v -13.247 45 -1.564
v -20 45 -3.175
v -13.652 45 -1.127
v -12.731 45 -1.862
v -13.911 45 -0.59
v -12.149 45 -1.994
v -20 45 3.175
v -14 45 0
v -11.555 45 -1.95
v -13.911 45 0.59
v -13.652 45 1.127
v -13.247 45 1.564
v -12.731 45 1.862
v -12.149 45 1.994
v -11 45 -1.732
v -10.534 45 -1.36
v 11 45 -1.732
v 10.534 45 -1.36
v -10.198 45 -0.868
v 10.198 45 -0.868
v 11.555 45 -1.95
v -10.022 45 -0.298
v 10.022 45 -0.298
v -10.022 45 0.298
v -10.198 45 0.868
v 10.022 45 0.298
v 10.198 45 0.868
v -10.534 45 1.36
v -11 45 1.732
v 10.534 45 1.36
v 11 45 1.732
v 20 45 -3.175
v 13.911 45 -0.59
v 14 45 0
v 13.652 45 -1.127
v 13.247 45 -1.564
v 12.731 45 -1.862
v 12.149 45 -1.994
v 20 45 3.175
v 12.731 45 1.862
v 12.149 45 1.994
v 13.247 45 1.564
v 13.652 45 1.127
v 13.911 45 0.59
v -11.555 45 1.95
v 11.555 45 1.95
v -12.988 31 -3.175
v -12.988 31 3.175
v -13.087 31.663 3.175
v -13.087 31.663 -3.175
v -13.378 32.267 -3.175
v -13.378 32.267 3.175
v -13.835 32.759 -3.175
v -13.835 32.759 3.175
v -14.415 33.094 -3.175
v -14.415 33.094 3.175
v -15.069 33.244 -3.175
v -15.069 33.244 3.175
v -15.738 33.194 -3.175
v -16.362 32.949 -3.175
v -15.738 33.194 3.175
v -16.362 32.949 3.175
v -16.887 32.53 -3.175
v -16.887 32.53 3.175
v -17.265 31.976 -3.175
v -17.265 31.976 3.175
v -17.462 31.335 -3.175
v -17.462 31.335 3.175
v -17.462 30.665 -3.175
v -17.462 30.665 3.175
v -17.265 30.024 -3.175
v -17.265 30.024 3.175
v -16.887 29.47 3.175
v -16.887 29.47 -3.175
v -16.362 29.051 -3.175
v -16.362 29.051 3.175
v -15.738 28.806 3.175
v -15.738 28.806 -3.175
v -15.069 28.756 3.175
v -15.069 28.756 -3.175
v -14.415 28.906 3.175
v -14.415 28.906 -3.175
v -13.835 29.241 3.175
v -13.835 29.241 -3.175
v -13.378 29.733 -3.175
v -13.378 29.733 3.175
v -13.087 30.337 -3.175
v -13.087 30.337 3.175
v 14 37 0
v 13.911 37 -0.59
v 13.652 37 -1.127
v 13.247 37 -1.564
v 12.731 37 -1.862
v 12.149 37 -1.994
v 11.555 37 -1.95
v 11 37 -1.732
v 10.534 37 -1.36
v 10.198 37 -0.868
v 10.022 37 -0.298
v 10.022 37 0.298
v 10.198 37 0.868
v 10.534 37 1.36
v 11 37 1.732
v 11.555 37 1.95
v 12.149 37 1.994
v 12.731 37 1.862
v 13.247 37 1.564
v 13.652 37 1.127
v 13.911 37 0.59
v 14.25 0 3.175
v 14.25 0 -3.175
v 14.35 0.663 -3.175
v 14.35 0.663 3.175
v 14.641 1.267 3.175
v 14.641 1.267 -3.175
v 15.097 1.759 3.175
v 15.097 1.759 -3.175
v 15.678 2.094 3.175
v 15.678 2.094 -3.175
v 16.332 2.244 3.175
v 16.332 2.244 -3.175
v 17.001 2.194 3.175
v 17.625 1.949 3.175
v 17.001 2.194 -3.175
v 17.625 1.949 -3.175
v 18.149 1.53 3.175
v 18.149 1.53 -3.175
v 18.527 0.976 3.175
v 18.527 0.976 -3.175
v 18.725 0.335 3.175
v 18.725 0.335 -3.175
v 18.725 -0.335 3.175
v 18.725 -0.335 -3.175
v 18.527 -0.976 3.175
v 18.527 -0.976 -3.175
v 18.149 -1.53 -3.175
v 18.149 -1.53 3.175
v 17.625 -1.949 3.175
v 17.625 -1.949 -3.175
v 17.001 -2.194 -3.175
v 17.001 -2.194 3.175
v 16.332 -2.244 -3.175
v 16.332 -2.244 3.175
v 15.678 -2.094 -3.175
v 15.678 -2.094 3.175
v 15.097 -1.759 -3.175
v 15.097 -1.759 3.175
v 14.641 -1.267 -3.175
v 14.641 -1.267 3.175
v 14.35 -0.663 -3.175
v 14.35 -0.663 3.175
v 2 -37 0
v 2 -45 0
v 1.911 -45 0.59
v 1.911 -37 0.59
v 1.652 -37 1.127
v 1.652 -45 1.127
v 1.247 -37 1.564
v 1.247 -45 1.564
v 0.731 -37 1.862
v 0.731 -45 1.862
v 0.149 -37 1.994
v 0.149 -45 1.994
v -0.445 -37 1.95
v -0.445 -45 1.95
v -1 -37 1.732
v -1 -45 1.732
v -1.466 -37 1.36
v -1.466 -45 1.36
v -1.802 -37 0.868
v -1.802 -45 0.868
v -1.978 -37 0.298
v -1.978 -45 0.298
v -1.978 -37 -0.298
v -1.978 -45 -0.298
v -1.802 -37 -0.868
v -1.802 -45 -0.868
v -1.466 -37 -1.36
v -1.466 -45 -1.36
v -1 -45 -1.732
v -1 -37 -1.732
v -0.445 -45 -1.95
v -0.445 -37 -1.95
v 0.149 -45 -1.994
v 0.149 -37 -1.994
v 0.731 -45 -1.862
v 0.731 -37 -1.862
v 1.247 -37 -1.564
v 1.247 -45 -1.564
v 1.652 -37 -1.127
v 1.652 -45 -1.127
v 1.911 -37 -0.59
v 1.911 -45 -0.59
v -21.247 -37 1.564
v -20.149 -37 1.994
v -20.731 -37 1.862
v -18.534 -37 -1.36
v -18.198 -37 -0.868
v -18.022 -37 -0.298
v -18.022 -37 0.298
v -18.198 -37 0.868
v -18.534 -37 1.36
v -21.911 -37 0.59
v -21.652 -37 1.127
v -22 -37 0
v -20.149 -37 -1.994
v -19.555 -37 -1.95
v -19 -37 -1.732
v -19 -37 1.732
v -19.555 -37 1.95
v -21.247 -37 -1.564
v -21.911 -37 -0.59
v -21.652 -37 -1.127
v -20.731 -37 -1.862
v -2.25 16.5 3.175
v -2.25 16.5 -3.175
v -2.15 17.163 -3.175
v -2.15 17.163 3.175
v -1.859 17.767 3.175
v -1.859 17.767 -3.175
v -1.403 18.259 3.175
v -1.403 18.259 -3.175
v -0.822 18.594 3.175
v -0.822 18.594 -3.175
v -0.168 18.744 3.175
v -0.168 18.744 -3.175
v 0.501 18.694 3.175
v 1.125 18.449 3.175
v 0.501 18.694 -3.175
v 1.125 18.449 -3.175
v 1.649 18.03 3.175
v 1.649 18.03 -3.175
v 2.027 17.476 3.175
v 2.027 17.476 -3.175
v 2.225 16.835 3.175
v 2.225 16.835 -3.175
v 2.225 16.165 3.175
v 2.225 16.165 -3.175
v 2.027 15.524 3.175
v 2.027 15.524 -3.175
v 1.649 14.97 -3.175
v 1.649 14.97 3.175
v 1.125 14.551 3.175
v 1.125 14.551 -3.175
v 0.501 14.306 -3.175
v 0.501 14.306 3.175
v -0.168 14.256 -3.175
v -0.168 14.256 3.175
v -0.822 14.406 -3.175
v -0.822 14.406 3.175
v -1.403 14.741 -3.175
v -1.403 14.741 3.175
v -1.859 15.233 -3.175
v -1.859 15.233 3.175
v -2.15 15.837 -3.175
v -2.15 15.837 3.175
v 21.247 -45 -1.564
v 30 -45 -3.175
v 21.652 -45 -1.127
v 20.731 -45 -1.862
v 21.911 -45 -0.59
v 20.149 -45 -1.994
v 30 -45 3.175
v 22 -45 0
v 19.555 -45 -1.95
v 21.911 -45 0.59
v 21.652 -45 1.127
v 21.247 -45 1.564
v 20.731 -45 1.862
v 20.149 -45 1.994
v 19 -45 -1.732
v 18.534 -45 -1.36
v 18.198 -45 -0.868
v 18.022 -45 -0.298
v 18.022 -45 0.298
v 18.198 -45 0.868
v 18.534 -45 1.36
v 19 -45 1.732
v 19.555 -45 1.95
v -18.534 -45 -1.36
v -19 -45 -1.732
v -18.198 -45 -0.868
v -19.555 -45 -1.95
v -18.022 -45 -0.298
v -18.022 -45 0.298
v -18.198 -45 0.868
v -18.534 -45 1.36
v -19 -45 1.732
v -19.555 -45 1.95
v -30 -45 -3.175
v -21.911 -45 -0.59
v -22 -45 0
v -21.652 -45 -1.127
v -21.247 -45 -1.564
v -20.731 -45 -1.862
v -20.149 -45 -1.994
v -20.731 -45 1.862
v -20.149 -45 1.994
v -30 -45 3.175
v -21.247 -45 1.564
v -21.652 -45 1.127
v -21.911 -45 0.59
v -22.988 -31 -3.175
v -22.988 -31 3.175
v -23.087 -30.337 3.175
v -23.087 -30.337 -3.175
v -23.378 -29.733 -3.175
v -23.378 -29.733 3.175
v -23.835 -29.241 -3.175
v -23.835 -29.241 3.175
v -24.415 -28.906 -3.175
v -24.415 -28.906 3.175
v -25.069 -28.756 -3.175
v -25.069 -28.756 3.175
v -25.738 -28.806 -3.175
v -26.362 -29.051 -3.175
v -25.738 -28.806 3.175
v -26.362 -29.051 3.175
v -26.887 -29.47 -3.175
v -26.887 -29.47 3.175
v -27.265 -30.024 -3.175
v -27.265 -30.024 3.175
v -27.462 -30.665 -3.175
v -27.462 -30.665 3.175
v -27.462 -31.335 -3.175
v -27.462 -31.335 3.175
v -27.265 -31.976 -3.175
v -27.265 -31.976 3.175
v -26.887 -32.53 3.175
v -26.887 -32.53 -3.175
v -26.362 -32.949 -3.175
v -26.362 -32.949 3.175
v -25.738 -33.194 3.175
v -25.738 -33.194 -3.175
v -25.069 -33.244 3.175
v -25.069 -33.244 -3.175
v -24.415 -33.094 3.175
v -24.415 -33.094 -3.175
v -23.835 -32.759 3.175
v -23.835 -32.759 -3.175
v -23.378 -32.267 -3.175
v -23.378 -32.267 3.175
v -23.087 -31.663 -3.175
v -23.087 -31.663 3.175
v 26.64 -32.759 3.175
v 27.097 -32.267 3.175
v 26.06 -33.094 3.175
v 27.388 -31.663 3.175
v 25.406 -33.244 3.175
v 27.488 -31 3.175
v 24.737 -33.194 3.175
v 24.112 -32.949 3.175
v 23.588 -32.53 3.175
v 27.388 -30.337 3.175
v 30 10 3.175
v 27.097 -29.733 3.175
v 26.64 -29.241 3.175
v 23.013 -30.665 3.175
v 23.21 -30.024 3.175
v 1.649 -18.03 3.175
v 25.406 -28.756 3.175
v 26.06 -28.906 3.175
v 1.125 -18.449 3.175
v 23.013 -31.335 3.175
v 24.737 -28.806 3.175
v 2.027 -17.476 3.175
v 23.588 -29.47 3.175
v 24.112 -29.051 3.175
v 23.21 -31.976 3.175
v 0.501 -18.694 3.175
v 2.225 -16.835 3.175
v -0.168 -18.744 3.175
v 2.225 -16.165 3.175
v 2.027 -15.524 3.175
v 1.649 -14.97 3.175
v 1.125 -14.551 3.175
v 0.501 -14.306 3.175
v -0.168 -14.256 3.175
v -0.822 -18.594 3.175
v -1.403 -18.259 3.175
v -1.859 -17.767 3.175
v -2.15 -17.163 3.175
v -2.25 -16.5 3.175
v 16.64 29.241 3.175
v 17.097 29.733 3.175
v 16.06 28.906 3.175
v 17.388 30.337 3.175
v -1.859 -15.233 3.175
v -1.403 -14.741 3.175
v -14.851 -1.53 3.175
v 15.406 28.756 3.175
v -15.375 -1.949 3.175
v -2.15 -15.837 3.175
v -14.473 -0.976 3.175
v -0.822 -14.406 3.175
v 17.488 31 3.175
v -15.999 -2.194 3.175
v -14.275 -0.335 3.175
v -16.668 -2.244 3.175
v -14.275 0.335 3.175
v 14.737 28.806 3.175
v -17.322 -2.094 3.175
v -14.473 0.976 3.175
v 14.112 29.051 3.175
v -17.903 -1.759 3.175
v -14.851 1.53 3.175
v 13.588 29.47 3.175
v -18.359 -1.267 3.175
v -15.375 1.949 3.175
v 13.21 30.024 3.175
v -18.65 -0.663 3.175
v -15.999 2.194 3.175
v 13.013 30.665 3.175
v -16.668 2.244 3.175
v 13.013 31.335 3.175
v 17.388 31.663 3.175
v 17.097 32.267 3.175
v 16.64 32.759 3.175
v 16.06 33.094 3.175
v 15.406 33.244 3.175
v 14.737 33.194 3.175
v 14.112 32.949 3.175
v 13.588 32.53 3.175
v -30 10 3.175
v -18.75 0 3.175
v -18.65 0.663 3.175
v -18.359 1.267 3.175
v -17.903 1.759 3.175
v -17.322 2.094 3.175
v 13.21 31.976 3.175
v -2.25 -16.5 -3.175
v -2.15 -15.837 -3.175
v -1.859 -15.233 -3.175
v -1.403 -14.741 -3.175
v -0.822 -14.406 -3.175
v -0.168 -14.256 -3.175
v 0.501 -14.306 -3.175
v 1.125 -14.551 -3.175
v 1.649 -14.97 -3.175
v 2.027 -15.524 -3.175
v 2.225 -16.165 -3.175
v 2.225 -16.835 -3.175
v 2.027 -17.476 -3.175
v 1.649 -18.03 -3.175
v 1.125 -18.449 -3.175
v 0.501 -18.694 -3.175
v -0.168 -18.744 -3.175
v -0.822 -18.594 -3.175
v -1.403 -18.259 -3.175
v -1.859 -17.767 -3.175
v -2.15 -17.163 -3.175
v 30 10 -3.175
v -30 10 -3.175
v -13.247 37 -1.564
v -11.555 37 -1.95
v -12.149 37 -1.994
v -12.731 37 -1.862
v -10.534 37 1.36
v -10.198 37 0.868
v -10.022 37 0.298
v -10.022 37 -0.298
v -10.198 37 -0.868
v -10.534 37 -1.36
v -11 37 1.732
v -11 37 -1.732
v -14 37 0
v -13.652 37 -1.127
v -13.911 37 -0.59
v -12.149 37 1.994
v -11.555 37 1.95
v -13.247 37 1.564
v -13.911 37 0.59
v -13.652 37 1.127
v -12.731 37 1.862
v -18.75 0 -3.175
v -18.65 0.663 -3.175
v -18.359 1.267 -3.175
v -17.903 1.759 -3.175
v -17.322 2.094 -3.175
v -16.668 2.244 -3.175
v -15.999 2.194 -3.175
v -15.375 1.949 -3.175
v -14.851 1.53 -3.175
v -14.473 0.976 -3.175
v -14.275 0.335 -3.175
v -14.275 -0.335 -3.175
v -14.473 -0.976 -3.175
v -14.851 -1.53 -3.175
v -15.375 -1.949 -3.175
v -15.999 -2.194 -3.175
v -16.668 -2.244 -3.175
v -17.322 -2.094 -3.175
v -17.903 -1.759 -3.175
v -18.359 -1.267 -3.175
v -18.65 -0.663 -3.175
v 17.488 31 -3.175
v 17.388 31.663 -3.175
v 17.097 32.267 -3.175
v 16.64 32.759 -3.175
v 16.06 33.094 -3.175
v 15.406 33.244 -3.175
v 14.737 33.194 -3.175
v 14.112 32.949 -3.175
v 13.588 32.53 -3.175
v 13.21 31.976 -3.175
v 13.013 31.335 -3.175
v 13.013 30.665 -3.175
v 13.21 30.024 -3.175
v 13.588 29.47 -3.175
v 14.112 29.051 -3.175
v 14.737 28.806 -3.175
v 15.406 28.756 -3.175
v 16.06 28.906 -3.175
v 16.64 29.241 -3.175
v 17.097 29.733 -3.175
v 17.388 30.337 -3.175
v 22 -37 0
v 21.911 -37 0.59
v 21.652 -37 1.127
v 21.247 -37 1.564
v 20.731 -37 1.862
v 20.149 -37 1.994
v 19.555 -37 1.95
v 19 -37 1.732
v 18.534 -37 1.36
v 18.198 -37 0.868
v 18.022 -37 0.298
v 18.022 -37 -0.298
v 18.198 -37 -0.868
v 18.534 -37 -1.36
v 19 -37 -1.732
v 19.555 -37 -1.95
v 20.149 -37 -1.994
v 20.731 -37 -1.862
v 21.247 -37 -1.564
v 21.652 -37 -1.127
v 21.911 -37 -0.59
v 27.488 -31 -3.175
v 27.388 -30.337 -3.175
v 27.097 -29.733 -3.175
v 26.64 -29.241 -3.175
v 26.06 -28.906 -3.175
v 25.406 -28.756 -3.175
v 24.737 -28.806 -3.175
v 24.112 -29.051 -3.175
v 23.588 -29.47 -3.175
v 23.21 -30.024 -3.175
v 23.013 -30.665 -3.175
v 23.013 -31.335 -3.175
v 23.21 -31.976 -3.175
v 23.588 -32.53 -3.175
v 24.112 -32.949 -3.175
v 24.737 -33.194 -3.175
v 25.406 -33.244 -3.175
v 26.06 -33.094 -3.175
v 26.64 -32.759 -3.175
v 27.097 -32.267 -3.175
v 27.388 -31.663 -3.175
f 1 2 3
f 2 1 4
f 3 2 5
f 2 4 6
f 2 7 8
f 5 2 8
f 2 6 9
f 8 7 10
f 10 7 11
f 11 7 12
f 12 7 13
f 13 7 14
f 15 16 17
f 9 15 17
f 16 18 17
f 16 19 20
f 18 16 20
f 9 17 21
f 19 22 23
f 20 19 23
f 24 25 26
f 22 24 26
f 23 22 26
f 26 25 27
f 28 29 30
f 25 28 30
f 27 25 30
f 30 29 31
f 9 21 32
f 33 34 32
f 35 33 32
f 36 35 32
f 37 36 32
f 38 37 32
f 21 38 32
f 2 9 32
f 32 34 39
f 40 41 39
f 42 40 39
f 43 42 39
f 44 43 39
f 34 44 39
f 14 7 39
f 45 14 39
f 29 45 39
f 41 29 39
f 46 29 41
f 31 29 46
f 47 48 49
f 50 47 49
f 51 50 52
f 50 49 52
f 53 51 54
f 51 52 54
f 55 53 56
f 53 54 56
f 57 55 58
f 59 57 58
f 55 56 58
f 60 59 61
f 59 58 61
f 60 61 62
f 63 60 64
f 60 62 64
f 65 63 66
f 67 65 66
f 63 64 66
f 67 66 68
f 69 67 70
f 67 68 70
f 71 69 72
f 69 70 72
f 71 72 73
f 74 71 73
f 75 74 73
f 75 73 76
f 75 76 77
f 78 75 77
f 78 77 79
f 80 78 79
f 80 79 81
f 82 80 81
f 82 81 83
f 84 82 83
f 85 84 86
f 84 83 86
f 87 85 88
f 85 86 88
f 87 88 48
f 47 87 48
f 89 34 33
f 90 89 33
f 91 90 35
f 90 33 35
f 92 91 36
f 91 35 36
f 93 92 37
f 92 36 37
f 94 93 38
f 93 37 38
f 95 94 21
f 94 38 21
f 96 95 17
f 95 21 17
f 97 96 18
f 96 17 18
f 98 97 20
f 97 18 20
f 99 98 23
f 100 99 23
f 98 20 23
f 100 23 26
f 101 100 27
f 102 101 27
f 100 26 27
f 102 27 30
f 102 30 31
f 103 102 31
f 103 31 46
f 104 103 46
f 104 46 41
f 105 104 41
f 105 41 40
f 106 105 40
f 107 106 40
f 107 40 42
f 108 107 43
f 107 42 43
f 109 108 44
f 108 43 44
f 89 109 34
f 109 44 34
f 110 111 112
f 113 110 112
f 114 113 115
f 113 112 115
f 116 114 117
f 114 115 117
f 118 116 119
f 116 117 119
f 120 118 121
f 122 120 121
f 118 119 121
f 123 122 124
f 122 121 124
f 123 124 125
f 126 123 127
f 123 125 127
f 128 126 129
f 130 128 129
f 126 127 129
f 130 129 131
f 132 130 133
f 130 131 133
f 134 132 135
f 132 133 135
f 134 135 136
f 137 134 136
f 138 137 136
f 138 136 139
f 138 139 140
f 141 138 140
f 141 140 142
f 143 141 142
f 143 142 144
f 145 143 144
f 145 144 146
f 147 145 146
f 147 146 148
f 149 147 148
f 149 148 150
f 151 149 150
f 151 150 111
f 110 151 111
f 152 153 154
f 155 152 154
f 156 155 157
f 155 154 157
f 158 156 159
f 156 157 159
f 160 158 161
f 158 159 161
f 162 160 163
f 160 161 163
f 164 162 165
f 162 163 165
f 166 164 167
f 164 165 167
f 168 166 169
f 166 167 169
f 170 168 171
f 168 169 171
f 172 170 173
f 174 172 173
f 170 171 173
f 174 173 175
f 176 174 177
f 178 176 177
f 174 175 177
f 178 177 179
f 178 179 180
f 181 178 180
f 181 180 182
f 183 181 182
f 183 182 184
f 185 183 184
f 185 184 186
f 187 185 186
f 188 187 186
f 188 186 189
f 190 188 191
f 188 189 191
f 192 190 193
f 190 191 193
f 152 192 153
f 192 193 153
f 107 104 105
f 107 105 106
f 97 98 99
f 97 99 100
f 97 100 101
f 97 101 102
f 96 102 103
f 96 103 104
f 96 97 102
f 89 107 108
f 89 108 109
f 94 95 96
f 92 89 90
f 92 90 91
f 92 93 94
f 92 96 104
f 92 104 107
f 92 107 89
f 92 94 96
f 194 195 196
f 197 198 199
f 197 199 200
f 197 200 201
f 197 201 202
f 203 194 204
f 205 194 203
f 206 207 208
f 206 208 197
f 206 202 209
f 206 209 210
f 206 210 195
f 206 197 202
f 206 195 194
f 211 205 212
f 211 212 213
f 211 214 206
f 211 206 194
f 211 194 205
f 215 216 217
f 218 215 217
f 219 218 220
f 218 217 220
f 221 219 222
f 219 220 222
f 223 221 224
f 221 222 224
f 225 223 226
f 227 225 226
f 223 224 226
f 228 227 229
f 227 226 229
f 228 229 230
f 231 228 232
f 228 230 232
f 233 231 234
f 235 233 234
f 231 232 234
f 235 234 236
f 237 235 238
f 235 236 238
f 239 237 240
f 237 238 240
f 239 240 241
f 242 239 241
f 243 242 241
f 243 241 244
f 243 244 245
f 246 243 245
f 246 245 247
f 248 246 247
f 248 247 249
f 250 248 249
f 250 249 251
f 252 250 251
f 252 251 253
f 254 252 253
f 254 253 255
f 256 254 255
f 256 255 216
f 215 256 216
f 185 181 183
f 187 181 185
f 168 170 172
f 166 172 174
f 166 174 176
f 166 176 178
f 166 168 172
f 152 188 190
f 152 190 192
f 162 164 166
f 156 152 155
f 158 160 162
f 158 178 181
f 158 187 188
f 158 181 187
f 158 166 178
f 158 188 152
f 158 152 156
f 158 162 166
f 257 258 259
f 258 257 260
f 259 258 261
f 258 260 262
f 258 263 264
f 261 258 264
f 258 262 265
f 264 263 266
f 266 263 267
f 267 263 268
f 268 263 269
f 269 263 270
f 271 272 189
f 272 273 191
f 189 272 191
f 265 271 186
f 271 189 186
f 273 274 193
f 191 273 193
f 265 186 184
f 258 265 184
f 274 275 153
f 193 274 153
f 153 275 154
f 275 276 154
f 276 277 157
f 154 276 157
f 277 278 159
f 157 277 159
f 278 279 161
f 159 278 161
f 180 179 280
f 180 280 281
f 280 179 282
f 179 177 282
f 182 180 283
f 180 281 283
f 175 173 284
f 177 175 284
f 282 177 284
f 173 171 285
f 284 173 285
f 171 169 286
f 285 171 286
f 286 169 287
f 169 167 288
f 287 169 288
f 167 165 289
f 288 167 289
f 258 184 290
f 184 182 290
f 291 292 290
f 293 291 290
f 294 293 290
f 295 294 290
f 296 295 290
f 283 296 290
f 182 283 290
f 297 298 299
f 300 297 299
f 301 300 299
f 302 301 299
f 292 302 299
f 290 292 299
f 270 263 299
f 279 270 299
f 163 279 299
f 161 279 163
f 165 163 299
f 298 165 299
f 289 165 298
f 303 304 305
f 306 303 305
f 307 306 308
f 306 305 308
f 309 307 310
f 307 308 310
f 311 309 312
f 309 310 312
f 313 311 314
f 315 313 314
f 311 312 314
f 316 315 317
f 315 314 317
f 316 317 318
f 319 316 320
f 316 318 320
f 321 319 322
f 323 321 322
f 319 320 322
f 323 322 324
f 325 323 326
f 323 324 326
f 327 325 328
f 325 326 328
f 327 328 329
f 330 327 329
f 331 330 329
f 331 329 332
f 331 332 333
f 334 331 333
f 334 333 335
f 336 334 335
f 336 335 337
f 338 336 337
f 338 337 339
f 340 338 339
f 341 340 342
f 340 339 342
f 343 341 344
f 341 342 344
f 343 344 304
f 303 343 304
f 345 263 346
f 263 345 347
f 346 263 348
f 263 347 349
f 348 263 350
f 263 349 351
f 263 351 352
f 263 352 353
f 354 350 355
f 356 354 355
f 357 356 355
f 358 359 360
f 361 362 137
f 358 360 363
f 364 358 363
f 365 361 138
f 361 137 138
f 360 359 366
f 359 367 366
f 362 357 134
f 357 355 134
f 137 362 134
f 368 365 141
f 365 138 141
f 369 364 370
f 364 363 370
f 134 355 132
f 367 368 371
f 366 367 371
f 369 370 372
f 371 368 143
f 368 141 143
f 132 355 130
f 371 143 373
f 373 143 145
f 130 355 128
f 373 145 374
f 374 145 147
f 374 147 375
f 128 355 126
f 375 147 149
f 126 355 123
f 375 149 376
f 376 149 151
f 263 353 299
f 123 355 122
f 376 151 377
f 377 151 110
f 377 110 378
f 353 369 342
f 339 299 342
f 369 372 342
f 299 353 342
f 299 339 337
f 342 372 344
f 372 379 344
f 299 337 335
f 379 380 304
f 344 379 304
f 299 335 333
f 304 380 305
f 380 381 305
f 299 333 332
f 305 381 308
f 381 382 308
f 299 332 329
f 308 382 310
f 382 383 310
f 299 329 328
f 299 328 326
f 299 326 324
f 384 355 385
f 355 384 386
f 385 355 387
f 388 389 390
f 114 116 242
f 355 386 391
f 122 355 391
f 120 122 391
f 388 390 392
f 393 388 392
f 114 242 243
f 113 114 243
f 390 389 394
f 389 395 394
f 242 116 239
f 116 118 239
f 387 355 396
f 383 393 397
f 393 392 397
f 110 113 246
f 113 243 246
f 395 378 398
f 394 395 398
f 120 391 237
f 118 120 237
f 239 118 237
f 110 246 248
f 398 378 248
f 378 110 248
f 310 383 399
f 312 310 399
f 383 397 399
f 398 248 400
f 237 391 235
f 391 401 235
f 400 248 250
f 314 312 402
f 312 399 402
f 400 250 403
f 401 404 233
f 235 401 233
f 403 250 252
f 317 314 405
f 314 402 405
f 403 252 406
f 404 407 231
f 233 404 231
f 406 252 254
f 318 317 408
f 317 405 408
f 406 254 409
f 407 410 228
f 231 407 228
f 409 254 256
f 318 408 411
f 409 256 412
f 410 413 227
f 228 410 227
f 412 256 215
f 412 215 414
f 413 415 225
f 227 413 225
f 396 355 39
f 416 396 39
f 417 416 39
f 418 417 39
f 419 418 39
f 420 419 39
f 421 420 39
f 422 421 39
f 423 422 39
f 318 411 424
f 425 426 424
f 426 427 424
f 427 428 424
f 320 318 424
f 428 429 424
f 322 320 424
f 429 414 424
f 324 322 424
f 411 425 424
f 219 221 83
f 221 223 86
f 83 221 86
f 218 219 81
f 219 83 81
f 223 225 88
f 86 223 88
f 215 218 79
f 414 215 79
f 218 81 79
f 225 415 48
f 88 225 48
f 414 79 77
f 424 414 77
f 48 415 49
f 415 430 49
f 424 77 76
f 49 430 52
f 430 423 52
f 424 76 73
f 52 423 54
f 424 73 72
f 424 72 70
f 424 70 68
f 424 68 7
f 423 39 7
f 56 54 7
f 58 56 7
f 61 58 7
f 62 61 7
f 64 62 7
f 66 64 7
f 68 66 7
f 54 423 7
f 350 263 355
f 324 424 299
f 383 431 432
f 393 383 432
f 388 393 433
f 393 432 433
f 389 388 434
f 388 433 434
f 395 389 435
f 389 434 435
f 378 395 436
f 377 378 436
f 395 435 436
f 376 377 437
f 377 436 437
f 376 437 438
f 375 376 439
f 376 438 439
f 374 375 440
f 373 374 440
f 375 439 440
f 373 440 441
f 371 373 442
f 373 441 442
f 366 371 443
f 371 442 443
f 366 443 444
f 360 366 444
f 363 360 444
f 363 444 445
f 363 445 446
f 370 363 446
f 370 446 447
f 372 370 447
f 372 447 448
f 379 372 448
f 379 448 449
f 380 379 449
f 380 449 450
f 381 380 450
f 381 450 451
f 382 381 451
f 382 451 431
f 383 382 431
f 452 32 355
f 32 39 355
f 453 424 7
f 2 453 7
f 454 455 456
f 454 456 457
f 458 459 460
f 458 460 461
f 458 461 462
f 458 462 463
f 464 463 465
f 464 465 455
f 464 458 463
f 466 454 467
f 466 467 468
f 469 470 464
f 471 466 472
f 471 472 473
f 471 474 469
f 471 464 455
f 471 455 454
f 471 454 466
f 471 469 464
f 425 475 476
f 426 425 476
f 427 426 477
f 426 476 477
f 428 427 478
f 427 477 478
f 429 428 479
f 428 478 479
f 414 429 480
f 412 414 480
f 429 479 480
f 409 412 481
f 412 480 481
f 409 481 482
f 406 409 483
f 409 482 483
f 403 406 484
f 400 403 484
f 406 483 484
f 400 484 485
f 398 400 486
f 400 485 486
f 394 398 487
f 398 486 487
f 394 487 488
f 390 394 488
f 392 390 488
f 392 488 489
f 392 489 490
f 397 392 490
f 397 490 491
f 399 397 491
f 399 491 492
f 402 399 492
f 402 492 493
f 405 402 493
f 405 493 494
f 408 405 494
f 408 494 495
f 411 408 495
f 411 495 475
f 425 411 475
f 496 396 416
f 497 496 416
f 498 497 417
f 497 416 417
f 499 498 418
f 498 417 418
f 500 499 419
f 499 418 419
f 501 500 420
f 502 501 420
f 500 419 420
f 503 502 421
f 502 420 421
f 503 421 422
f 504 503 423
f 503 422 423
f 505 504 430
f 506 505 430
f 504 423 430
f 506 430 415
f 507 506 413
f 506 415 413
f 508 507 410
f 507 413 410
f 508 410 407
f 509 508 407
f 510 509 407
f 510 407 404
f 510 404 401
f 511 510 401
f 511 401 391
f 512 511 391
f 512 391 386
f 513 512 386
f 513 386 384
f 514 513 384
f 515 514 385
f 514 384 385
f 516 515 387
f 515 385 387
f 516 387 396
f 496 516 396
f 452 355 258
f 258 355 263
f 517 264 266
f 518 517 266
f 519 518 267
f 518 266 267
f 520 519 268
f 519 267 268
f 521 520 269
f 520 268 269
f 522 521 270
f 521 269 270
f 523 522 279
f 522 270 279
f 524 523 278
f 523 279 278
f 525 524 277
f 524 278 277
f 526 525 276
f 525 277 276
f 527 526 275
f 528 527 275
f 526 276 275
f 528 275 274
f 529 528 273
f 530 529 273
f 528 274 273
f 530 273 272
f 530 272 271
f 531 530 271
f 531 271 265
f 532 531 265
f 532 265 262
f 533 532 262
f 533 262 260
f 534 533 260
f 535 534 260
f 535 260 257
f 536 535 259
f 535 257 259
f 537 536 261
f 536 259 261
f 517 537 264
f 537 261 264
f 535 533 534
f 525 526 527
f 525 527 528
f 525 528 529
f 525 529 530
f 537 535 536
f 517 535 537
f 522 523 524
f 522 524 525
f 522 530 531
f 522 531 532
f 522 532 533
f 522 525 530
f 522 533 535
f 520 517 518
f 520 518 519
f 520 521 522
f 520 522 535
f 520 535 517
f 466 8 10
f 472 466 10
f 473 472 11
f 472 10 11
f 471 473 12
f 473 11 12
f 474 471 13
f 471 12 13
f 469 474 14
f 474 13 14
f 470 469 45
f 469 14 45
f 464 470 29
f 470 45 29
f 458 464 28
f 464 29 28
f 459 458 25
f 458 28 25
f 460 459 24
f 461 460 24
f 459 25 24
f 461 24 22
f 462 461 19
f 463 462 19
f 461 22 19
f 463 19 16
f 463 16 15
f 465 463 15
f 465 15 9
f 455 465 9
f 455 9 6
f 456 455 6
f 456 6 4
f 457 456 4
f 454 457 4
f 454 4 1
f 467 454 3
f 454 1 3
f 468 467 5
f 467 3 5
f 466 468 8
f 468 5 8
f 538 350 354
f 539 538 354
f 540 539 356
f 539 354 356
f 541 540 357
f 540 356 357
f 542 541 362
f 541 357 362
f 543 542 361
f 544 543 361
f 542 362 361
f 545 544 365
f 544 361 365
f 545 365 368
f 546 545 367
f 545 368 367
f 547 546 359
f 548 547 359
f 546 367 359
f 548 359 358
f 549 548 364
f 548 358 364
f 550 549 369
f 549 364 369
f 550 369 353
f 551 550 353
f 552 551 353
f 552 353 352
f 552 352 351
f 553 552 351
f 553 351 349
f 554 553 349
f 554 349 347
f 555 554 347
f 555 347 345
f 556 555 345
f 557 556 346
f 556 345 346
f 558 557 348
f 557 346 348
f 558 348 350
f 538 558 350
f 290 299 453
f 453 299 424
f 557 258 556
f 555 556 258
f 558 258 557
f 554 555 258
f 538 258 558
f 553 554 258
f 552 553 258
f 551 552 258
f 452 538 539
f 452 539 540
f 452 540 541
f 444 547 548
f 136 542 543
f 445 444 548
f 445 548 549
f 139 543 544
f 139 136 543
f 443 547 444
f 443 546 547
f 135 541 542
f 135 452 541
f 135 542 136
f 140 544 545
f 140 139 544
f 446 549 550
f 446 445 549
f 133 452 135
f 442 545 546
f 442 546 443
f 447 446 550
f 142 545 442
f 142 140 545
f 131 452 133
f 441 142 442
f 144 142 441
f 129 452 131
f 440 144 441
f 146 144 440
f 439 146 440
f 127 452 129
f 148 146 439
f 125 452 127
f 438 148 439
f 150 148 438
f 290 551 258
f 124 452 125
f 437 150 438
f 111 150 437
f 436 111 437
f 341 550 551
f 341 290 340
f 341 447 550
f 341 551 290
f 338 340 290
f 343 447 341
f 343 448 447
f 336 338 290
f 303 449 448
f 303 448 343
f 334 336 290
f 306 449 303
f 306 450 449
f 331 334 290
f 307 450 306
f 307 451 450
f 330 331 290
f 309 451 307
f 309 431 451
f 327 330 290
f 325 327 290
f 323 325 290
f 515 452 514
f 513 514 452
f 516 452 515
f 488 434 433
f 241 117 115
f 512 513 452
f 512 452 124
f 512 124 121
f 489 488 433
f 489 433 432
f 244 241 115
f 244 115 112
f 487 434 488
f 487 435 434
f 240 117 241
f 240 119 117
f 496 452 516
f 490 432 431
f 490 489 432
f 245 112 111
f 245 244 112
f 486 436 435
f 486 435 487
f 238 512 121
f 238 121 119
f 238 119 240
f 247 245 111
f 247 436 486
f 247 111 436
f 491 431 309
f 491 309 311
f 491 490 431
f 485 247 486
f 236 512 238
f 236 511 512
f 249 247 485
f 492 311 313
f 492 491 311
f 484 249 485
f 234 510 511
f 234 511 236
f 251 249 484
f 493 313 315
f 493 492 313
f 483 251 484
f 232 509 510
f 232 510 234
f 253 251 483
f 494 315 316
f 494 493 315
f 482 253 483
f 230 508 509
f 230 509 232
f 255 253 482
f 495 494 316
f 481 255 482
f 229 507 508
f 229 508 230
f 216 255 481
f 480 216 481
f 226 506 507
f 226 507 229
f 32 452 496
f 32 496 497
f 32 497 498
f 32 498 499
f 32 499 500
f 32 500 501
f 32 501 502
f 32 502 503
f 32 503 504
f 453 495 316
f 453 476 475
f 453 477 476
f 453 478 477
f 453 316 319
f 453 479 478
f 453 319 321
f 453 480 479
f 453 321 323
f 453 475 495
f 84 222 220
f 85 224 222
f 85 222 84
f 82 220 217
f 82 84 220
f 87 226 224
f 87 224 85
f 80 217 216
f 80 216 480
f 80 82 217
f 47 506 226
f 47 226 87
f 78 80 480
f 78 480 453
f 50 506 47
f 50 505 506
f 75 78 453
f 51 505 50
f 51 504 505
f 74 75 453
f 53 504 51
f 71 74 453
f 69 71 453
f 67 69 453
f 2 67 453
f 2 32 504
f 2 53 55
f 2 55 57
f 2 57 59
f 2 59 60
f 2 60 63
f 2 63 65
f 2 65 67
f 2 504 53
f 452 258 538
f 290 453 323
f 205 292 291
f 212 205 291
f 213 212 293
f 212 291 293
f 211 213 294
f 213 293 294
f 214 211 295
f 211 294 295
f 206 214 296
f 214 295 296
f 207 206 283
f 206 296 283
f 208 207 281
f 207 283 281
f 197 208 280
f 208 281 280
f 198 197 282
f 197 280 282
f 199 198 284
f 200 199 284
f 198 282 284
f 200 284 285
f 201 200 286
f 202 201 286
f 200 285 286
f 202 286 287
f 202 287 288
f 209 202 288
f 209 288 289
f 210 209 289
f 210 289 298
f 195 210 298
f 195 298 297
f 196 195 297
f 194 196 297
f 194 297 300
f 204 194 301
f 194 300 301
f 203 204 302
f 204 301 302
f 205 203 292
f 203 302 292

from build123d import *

# Parameters (mm, degrees)
EXTRUDE_1_4_DEPTH = 3.175
SKETCH4_R         = 2
M4_DRILL_DEPTH    = 8
SKETCH5_R         = 2
M4_DRILL2_DEPTH   = 8
SKETCH6_R         = 2.25
M4_THROUGH_DEPTH  = 6.35
SKETCH8_R         = 2.25
M4_THROUGH2_DEPTH = 10


with BuildPart() as part:
    # Sketch1 → 1/4 (new, symmetric)
    with BuildSketch(Plane.XY):
        Polygon((-20, 45), (20, 45), (30, 10), (30, -45), (-30, -45), (-30, 10), align=None)
    extrude(amount=EXTRUDE_1_4_DEPTH, both=True)

    # Sketch4 → M4_DRILL (cut)
    with BuildSketch(Plane(origin=(0, 45, 0), x_dir=(1, 0, 0), z_dir=(0, 1, 0))):
        with Locations(Location((-12, 0, 0), (0, 0, 180))):
            Circle(SKETCH4_R)
        with Locations((12, 0)):
            Circle(SKETCH4_R)
    extrude(amount=-M4_DRILL_DEPTH, mode=Mode.SUBTRACT)

    # Sketch5 → M4_DRILL2 (cut)
    with BuildSketch(Plane(origin=(0, -45, 0), x_dir=(-1, 0, 0), z_dir=(0, -1, 0))):
        with Locations(Location((-20, 0, 0), (0, 0, 180))):
            Circle(SKETCH5_R)
        with Locations((20, 0)):
            Circle(SKETCH5_R)
        with Locations(Location((0, 0, 0), (0, 0, 180))):
            Circle(SKETCH5_R)
    extrude(amount=-M4_DRILL2_DEPTH, mode=Mode.SUBTRACT)

    # Sketch6 → M4_through (cut)
    with BuildSketch(Plane.XY.offset(3.175)):
        with Locations((-25.2375, -31)):
            Circle(SKETCH6_R)
        with Locations((25.2375, -31)):
            Circle(SKETCH6_R)
        with Locations((-15.2375, 31)):
            Circle(SKETCH6_R)
        with Locations((15.2375, 31)):
            Circle(SKETCH6_R)
    extrude(amount=-M4_THROUGH_DEPTH, mode=Mode.SUBTRACT)

    # Sketch8 → M4_through2 (cut)
    with BuildSketch(Plane(origin=(0, 0, -3.175), x_dir=(-1, 0, 0), z_dir=(0, 0, -1))):
        with Locations((0, 16.5)):
            Circle(SKETCH8_R)
        with Locations((16.5, 0)):
            Circle(SKETCH8_R)
        with Locations((0, -16.5)):
            Circle(SKETCH8_R)
        with Locations((-16.5, 0)):
            Circle(SKETCH8_R)
    extrude(amount=-M4_THROUGH2_DEPTH, mode=Mode.SUBTRACT)


solid = part.part
